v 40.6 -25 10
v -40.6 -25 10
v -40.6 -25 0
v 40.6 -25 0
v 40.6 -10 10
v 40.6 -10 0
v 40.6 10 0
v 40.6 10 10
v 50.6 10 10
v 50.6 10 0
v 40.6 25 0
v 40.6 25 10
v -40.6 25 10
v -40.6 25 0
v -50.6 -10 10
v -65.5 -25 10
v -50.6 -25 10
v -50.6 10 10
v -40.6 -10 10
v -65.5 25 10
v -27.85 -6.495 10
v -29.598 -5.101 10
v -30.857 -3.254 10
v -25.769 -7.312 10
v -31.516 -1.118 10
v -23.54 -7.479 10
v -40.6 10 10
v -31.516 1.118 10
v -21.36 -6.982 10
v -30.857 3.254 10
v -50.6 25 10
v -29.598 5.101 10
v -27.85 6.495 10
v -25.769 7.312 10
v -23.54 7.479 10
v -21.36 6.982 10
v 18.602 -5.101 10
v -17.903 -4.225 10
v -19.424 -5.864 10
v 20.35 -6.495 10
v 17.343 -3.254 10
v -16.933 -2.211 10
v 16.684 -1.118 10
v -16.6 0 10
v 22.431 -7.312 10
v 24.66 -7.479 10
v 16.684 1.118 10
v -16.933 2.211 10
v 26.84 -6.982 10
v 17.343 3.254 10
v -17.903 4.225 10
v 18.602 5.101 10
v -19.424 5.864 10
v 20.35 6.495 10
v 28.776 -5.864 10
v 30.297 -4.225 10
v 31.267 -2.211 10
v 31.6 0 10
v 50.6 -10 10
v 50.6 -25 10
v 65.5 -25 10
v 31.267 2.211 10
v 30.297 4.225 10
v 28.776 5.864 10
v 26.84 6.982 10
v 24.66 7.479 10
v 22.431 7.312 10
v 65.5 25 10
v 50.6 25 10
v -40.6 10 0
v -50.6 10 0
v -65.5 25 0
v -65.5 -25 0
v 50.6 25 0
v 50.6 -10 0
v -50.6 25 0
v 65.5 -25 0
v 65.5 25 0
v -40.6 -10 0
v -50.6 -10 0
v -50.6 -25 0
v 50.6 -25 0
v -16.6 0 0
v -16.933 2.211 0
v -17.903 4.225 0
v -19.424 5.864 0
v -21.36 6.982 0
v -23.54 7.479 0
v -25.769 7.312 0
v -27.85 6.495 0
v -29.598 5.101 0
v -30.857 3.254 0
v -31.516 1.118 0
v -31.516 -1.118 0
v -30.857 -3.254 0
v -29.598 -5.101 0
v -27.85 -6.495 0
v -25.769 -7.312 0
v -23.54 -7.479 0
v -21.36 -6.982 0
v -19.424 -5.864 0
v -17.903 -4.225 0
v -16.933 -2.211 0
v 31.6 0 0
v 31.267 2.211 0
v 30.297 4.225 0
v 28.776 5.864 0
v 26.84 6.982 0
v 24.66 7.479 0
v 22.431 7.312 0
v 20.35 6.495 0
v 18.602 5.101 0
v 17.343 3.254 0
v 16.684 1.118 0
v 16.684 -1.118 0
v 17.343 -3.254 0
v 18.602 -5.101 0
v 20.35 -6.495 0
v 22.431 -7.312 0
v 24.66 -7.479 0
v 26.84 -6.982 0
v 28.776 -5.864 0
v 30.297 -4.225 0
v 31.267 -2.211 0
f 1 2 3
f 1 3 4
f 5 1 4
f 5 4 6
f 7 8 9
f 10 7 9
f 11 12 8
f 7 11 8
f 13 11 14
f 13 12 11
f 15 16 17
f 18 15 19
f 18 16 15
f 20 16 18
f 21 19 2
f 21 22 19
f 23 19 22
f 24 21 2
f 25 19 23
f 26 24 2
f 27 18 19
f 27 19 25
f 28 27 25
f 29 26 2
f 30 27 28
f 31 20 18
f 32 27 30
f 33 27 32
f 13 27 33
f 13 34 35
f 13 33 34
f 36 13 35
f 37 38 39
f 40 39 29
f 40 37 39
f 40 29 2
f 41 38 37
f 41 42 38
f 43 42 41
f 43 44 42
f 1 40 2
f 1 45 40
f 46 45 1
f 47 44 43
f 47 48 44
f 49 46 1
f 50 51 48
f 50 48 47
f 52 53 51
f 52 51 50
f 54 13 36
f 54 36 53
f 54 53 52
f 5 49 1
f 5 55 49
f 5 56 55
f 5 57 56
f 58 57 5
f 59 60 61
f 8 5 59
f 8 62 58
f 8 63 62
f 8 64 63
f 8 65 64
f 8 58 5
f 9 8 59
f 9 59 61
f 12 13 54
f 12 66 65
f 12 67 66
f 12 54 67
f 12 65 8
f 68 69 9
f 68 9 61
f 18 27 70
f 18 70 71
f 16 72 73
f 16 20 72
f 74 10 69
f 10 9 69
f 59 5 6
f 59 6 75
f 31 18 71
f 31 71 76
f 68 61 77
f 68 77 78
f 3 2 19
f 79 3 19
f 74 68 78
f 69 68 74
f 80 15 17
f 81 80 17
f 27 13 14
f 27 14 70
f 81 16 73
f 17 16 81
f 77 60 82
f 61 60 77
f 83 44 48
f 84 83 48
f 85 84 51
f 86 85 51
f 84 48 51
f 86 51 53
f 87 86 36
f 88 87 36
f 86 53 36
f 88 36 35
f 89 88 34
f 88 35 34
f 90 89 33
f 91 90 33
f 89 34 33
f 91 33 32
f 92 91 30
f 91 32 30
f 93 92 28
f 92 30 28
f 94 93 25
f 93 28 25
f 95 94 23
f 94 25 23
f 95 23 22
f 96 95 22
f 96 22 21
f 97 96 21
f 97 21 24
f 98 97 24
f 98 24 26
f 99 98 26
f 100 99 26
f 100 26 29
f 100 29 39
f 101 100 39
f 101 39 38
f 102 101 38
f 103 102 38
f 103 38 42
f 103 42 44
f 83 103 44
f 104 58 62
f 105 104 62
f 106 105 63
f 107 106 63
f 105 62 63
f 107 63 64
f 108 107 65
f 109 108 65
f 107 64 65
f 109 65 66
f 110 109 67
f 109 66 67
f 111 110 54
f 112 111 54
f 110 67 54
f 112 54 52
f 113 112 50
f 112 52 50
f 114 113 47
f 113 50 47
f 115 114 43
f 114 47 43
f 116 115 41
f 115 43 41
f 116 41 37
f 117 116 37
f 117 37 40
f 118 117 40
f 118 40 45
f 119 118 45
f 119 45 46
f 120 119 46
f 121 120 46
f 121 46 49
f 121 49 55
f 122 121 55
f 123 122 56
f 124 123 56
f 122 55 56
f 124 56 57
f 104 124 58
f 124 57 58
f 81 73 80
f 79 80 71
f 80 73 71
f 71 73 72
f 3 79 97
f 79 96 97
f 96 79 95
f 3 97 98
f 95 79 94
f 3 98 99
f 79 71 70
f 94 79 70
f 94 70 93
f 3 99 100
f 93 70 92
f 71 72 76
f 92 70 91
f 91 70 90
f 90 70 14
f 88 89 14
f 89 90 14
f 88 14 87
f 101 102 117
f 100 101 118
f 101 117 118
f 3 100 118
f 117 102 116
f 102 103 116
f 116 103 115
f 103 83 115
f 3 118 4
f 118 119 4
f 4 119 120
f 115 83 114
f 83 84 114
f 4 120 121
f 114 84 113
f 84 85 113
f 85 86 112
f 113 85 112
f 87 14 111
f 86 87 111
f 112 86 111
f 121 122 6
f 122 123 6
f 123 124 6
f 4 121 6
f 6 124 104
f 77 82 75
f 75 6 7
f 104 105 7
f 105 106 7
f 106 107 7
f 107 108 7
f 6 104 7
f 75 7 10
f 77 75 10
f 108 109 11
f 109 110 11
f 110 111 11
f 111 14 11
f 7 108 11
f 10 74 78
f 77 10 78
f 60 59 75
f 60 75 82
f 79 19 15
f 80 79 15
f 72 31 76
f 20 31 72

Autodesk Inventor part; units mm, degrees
ref_plane "YZ Plane" through (0, 0, 0) normal (1, 0, 0) x (0, 1, 0)
ref_plane "XZ Plane" through (0, 0, 0) normal (0, 1, 0) x (-1, 0, 0)
ref_plane "XY Plane" through (0, 0, 0) normal (0, 0, 1) x (1, 0, 0)
sketch "Sketch1" plane through (0, 0, 0) normal (0, 0, 1) x (1, 0, 0)
  line L0 (65.5, 25) -> (-65.5, 25)
  line L1 (-65.5, 25) -> (-65.5, -25)
  line L2 (-65.5, -25) -> (65.5, -25)
  line L3 (65.5, -25) -> (65.5, 25)
  line L4 (65.5, 25) -> (-65.5, -25) construction
  line L5 (-65.5, 25) -> (65.5, -25) construction
  line L6 (0, 0) -> (-24.1, 0)
  line L7 (0, 0) -> (24.1, 0)
  circle A0 centre (-24.1, 0) radius 7.5
  circle A1 centre (24.1, 0) radius 7.5
  dimension "d0" = 131
  dimension "d1" = 50
  dimension "d2" = 24.1
  dimension "d3" = 24.1
  dimension "d4" = 15
  dimension "d5" = 15
extrude "Extrusion1" add sketch "Sketch1" along normal blind 10
sketch "Sketch2" plane through (0, 0, 10) normal (0, 0, 1) x (1, 0, 0)
  circle A0 centre (24.1, 0) radius 7.5 projected
  circle A1 centre (-24.1, 0) radius 7.5 projected
  line L0 (65.5, 25) -> (-65.5, 25) projected
  line L1 (-65.5, 25) -> (-65.5, -25) projected
  line L2 (-65.5, -25) -> (65.5, -25) projected
  line L3 (65.5, -25) -> (65.5, 25) projected
  line L4 (-40.6, 25) -> (-40.6, 10)
  line L5 (-40.6, 10) -> (-50.6, 10)
  line L6 (-50.6, 10) -> (-50.6, 25)
  line L7 (-40.6, -25) -> (-40.6, -10)
  line L8 (-40.6, -10) -> (-50.6, -10)
  line L9 (-50.6, -10) -> (-50.6, -25)
  line L10 (40.6, 25) -> (40.6, 10)
  line L11 (40.6, 10) -> (50.6, 10)
  line L12 (50.6, 10) -> (50.6, 25)
  line L13 (40.6, -25) -> (40.6, -10)
  line L14 (40.6, -10) -> (50.6, -10)
  line L15 (50.6, -10) -> (50.6, -25)
  point P0 (0, 0)
  dimension "d10" = 15
  dimension "d12" = 15
  dimension "d14" = 15
  dimension "d16" = 15
sketch "Sketch3" plane through (0, 0, 10) normal (0, 0, 1) x (1, 0, 0)
  circle A0 centre (24.1, 0) radius 7.5 projected
  circle A1 centre (-24.1, 0) radius 7.5 projected
  line L0 (65.5, 25) -> (-65.5, 25) projected
  line L1 (-65.5, 25) -> (-65.5, -25) projected
  line L2 (-65.5, -25) -> (65.5, -25) projected
  line L3 (65.5, -25) -> (65.5, 25) projected
  point P0 (0, 0)
extrude "Extrusion2" cut sketch "Sketch3" against normal blind 10
extrude "Extrusion3" add sketch "Sketch2" against normal blind 10 contours L3 L2 L15 L14 L13 L7 L8 L9 L1 L0 L6 L5 L4 L10 L11 L12
properties part number "prepazka"
